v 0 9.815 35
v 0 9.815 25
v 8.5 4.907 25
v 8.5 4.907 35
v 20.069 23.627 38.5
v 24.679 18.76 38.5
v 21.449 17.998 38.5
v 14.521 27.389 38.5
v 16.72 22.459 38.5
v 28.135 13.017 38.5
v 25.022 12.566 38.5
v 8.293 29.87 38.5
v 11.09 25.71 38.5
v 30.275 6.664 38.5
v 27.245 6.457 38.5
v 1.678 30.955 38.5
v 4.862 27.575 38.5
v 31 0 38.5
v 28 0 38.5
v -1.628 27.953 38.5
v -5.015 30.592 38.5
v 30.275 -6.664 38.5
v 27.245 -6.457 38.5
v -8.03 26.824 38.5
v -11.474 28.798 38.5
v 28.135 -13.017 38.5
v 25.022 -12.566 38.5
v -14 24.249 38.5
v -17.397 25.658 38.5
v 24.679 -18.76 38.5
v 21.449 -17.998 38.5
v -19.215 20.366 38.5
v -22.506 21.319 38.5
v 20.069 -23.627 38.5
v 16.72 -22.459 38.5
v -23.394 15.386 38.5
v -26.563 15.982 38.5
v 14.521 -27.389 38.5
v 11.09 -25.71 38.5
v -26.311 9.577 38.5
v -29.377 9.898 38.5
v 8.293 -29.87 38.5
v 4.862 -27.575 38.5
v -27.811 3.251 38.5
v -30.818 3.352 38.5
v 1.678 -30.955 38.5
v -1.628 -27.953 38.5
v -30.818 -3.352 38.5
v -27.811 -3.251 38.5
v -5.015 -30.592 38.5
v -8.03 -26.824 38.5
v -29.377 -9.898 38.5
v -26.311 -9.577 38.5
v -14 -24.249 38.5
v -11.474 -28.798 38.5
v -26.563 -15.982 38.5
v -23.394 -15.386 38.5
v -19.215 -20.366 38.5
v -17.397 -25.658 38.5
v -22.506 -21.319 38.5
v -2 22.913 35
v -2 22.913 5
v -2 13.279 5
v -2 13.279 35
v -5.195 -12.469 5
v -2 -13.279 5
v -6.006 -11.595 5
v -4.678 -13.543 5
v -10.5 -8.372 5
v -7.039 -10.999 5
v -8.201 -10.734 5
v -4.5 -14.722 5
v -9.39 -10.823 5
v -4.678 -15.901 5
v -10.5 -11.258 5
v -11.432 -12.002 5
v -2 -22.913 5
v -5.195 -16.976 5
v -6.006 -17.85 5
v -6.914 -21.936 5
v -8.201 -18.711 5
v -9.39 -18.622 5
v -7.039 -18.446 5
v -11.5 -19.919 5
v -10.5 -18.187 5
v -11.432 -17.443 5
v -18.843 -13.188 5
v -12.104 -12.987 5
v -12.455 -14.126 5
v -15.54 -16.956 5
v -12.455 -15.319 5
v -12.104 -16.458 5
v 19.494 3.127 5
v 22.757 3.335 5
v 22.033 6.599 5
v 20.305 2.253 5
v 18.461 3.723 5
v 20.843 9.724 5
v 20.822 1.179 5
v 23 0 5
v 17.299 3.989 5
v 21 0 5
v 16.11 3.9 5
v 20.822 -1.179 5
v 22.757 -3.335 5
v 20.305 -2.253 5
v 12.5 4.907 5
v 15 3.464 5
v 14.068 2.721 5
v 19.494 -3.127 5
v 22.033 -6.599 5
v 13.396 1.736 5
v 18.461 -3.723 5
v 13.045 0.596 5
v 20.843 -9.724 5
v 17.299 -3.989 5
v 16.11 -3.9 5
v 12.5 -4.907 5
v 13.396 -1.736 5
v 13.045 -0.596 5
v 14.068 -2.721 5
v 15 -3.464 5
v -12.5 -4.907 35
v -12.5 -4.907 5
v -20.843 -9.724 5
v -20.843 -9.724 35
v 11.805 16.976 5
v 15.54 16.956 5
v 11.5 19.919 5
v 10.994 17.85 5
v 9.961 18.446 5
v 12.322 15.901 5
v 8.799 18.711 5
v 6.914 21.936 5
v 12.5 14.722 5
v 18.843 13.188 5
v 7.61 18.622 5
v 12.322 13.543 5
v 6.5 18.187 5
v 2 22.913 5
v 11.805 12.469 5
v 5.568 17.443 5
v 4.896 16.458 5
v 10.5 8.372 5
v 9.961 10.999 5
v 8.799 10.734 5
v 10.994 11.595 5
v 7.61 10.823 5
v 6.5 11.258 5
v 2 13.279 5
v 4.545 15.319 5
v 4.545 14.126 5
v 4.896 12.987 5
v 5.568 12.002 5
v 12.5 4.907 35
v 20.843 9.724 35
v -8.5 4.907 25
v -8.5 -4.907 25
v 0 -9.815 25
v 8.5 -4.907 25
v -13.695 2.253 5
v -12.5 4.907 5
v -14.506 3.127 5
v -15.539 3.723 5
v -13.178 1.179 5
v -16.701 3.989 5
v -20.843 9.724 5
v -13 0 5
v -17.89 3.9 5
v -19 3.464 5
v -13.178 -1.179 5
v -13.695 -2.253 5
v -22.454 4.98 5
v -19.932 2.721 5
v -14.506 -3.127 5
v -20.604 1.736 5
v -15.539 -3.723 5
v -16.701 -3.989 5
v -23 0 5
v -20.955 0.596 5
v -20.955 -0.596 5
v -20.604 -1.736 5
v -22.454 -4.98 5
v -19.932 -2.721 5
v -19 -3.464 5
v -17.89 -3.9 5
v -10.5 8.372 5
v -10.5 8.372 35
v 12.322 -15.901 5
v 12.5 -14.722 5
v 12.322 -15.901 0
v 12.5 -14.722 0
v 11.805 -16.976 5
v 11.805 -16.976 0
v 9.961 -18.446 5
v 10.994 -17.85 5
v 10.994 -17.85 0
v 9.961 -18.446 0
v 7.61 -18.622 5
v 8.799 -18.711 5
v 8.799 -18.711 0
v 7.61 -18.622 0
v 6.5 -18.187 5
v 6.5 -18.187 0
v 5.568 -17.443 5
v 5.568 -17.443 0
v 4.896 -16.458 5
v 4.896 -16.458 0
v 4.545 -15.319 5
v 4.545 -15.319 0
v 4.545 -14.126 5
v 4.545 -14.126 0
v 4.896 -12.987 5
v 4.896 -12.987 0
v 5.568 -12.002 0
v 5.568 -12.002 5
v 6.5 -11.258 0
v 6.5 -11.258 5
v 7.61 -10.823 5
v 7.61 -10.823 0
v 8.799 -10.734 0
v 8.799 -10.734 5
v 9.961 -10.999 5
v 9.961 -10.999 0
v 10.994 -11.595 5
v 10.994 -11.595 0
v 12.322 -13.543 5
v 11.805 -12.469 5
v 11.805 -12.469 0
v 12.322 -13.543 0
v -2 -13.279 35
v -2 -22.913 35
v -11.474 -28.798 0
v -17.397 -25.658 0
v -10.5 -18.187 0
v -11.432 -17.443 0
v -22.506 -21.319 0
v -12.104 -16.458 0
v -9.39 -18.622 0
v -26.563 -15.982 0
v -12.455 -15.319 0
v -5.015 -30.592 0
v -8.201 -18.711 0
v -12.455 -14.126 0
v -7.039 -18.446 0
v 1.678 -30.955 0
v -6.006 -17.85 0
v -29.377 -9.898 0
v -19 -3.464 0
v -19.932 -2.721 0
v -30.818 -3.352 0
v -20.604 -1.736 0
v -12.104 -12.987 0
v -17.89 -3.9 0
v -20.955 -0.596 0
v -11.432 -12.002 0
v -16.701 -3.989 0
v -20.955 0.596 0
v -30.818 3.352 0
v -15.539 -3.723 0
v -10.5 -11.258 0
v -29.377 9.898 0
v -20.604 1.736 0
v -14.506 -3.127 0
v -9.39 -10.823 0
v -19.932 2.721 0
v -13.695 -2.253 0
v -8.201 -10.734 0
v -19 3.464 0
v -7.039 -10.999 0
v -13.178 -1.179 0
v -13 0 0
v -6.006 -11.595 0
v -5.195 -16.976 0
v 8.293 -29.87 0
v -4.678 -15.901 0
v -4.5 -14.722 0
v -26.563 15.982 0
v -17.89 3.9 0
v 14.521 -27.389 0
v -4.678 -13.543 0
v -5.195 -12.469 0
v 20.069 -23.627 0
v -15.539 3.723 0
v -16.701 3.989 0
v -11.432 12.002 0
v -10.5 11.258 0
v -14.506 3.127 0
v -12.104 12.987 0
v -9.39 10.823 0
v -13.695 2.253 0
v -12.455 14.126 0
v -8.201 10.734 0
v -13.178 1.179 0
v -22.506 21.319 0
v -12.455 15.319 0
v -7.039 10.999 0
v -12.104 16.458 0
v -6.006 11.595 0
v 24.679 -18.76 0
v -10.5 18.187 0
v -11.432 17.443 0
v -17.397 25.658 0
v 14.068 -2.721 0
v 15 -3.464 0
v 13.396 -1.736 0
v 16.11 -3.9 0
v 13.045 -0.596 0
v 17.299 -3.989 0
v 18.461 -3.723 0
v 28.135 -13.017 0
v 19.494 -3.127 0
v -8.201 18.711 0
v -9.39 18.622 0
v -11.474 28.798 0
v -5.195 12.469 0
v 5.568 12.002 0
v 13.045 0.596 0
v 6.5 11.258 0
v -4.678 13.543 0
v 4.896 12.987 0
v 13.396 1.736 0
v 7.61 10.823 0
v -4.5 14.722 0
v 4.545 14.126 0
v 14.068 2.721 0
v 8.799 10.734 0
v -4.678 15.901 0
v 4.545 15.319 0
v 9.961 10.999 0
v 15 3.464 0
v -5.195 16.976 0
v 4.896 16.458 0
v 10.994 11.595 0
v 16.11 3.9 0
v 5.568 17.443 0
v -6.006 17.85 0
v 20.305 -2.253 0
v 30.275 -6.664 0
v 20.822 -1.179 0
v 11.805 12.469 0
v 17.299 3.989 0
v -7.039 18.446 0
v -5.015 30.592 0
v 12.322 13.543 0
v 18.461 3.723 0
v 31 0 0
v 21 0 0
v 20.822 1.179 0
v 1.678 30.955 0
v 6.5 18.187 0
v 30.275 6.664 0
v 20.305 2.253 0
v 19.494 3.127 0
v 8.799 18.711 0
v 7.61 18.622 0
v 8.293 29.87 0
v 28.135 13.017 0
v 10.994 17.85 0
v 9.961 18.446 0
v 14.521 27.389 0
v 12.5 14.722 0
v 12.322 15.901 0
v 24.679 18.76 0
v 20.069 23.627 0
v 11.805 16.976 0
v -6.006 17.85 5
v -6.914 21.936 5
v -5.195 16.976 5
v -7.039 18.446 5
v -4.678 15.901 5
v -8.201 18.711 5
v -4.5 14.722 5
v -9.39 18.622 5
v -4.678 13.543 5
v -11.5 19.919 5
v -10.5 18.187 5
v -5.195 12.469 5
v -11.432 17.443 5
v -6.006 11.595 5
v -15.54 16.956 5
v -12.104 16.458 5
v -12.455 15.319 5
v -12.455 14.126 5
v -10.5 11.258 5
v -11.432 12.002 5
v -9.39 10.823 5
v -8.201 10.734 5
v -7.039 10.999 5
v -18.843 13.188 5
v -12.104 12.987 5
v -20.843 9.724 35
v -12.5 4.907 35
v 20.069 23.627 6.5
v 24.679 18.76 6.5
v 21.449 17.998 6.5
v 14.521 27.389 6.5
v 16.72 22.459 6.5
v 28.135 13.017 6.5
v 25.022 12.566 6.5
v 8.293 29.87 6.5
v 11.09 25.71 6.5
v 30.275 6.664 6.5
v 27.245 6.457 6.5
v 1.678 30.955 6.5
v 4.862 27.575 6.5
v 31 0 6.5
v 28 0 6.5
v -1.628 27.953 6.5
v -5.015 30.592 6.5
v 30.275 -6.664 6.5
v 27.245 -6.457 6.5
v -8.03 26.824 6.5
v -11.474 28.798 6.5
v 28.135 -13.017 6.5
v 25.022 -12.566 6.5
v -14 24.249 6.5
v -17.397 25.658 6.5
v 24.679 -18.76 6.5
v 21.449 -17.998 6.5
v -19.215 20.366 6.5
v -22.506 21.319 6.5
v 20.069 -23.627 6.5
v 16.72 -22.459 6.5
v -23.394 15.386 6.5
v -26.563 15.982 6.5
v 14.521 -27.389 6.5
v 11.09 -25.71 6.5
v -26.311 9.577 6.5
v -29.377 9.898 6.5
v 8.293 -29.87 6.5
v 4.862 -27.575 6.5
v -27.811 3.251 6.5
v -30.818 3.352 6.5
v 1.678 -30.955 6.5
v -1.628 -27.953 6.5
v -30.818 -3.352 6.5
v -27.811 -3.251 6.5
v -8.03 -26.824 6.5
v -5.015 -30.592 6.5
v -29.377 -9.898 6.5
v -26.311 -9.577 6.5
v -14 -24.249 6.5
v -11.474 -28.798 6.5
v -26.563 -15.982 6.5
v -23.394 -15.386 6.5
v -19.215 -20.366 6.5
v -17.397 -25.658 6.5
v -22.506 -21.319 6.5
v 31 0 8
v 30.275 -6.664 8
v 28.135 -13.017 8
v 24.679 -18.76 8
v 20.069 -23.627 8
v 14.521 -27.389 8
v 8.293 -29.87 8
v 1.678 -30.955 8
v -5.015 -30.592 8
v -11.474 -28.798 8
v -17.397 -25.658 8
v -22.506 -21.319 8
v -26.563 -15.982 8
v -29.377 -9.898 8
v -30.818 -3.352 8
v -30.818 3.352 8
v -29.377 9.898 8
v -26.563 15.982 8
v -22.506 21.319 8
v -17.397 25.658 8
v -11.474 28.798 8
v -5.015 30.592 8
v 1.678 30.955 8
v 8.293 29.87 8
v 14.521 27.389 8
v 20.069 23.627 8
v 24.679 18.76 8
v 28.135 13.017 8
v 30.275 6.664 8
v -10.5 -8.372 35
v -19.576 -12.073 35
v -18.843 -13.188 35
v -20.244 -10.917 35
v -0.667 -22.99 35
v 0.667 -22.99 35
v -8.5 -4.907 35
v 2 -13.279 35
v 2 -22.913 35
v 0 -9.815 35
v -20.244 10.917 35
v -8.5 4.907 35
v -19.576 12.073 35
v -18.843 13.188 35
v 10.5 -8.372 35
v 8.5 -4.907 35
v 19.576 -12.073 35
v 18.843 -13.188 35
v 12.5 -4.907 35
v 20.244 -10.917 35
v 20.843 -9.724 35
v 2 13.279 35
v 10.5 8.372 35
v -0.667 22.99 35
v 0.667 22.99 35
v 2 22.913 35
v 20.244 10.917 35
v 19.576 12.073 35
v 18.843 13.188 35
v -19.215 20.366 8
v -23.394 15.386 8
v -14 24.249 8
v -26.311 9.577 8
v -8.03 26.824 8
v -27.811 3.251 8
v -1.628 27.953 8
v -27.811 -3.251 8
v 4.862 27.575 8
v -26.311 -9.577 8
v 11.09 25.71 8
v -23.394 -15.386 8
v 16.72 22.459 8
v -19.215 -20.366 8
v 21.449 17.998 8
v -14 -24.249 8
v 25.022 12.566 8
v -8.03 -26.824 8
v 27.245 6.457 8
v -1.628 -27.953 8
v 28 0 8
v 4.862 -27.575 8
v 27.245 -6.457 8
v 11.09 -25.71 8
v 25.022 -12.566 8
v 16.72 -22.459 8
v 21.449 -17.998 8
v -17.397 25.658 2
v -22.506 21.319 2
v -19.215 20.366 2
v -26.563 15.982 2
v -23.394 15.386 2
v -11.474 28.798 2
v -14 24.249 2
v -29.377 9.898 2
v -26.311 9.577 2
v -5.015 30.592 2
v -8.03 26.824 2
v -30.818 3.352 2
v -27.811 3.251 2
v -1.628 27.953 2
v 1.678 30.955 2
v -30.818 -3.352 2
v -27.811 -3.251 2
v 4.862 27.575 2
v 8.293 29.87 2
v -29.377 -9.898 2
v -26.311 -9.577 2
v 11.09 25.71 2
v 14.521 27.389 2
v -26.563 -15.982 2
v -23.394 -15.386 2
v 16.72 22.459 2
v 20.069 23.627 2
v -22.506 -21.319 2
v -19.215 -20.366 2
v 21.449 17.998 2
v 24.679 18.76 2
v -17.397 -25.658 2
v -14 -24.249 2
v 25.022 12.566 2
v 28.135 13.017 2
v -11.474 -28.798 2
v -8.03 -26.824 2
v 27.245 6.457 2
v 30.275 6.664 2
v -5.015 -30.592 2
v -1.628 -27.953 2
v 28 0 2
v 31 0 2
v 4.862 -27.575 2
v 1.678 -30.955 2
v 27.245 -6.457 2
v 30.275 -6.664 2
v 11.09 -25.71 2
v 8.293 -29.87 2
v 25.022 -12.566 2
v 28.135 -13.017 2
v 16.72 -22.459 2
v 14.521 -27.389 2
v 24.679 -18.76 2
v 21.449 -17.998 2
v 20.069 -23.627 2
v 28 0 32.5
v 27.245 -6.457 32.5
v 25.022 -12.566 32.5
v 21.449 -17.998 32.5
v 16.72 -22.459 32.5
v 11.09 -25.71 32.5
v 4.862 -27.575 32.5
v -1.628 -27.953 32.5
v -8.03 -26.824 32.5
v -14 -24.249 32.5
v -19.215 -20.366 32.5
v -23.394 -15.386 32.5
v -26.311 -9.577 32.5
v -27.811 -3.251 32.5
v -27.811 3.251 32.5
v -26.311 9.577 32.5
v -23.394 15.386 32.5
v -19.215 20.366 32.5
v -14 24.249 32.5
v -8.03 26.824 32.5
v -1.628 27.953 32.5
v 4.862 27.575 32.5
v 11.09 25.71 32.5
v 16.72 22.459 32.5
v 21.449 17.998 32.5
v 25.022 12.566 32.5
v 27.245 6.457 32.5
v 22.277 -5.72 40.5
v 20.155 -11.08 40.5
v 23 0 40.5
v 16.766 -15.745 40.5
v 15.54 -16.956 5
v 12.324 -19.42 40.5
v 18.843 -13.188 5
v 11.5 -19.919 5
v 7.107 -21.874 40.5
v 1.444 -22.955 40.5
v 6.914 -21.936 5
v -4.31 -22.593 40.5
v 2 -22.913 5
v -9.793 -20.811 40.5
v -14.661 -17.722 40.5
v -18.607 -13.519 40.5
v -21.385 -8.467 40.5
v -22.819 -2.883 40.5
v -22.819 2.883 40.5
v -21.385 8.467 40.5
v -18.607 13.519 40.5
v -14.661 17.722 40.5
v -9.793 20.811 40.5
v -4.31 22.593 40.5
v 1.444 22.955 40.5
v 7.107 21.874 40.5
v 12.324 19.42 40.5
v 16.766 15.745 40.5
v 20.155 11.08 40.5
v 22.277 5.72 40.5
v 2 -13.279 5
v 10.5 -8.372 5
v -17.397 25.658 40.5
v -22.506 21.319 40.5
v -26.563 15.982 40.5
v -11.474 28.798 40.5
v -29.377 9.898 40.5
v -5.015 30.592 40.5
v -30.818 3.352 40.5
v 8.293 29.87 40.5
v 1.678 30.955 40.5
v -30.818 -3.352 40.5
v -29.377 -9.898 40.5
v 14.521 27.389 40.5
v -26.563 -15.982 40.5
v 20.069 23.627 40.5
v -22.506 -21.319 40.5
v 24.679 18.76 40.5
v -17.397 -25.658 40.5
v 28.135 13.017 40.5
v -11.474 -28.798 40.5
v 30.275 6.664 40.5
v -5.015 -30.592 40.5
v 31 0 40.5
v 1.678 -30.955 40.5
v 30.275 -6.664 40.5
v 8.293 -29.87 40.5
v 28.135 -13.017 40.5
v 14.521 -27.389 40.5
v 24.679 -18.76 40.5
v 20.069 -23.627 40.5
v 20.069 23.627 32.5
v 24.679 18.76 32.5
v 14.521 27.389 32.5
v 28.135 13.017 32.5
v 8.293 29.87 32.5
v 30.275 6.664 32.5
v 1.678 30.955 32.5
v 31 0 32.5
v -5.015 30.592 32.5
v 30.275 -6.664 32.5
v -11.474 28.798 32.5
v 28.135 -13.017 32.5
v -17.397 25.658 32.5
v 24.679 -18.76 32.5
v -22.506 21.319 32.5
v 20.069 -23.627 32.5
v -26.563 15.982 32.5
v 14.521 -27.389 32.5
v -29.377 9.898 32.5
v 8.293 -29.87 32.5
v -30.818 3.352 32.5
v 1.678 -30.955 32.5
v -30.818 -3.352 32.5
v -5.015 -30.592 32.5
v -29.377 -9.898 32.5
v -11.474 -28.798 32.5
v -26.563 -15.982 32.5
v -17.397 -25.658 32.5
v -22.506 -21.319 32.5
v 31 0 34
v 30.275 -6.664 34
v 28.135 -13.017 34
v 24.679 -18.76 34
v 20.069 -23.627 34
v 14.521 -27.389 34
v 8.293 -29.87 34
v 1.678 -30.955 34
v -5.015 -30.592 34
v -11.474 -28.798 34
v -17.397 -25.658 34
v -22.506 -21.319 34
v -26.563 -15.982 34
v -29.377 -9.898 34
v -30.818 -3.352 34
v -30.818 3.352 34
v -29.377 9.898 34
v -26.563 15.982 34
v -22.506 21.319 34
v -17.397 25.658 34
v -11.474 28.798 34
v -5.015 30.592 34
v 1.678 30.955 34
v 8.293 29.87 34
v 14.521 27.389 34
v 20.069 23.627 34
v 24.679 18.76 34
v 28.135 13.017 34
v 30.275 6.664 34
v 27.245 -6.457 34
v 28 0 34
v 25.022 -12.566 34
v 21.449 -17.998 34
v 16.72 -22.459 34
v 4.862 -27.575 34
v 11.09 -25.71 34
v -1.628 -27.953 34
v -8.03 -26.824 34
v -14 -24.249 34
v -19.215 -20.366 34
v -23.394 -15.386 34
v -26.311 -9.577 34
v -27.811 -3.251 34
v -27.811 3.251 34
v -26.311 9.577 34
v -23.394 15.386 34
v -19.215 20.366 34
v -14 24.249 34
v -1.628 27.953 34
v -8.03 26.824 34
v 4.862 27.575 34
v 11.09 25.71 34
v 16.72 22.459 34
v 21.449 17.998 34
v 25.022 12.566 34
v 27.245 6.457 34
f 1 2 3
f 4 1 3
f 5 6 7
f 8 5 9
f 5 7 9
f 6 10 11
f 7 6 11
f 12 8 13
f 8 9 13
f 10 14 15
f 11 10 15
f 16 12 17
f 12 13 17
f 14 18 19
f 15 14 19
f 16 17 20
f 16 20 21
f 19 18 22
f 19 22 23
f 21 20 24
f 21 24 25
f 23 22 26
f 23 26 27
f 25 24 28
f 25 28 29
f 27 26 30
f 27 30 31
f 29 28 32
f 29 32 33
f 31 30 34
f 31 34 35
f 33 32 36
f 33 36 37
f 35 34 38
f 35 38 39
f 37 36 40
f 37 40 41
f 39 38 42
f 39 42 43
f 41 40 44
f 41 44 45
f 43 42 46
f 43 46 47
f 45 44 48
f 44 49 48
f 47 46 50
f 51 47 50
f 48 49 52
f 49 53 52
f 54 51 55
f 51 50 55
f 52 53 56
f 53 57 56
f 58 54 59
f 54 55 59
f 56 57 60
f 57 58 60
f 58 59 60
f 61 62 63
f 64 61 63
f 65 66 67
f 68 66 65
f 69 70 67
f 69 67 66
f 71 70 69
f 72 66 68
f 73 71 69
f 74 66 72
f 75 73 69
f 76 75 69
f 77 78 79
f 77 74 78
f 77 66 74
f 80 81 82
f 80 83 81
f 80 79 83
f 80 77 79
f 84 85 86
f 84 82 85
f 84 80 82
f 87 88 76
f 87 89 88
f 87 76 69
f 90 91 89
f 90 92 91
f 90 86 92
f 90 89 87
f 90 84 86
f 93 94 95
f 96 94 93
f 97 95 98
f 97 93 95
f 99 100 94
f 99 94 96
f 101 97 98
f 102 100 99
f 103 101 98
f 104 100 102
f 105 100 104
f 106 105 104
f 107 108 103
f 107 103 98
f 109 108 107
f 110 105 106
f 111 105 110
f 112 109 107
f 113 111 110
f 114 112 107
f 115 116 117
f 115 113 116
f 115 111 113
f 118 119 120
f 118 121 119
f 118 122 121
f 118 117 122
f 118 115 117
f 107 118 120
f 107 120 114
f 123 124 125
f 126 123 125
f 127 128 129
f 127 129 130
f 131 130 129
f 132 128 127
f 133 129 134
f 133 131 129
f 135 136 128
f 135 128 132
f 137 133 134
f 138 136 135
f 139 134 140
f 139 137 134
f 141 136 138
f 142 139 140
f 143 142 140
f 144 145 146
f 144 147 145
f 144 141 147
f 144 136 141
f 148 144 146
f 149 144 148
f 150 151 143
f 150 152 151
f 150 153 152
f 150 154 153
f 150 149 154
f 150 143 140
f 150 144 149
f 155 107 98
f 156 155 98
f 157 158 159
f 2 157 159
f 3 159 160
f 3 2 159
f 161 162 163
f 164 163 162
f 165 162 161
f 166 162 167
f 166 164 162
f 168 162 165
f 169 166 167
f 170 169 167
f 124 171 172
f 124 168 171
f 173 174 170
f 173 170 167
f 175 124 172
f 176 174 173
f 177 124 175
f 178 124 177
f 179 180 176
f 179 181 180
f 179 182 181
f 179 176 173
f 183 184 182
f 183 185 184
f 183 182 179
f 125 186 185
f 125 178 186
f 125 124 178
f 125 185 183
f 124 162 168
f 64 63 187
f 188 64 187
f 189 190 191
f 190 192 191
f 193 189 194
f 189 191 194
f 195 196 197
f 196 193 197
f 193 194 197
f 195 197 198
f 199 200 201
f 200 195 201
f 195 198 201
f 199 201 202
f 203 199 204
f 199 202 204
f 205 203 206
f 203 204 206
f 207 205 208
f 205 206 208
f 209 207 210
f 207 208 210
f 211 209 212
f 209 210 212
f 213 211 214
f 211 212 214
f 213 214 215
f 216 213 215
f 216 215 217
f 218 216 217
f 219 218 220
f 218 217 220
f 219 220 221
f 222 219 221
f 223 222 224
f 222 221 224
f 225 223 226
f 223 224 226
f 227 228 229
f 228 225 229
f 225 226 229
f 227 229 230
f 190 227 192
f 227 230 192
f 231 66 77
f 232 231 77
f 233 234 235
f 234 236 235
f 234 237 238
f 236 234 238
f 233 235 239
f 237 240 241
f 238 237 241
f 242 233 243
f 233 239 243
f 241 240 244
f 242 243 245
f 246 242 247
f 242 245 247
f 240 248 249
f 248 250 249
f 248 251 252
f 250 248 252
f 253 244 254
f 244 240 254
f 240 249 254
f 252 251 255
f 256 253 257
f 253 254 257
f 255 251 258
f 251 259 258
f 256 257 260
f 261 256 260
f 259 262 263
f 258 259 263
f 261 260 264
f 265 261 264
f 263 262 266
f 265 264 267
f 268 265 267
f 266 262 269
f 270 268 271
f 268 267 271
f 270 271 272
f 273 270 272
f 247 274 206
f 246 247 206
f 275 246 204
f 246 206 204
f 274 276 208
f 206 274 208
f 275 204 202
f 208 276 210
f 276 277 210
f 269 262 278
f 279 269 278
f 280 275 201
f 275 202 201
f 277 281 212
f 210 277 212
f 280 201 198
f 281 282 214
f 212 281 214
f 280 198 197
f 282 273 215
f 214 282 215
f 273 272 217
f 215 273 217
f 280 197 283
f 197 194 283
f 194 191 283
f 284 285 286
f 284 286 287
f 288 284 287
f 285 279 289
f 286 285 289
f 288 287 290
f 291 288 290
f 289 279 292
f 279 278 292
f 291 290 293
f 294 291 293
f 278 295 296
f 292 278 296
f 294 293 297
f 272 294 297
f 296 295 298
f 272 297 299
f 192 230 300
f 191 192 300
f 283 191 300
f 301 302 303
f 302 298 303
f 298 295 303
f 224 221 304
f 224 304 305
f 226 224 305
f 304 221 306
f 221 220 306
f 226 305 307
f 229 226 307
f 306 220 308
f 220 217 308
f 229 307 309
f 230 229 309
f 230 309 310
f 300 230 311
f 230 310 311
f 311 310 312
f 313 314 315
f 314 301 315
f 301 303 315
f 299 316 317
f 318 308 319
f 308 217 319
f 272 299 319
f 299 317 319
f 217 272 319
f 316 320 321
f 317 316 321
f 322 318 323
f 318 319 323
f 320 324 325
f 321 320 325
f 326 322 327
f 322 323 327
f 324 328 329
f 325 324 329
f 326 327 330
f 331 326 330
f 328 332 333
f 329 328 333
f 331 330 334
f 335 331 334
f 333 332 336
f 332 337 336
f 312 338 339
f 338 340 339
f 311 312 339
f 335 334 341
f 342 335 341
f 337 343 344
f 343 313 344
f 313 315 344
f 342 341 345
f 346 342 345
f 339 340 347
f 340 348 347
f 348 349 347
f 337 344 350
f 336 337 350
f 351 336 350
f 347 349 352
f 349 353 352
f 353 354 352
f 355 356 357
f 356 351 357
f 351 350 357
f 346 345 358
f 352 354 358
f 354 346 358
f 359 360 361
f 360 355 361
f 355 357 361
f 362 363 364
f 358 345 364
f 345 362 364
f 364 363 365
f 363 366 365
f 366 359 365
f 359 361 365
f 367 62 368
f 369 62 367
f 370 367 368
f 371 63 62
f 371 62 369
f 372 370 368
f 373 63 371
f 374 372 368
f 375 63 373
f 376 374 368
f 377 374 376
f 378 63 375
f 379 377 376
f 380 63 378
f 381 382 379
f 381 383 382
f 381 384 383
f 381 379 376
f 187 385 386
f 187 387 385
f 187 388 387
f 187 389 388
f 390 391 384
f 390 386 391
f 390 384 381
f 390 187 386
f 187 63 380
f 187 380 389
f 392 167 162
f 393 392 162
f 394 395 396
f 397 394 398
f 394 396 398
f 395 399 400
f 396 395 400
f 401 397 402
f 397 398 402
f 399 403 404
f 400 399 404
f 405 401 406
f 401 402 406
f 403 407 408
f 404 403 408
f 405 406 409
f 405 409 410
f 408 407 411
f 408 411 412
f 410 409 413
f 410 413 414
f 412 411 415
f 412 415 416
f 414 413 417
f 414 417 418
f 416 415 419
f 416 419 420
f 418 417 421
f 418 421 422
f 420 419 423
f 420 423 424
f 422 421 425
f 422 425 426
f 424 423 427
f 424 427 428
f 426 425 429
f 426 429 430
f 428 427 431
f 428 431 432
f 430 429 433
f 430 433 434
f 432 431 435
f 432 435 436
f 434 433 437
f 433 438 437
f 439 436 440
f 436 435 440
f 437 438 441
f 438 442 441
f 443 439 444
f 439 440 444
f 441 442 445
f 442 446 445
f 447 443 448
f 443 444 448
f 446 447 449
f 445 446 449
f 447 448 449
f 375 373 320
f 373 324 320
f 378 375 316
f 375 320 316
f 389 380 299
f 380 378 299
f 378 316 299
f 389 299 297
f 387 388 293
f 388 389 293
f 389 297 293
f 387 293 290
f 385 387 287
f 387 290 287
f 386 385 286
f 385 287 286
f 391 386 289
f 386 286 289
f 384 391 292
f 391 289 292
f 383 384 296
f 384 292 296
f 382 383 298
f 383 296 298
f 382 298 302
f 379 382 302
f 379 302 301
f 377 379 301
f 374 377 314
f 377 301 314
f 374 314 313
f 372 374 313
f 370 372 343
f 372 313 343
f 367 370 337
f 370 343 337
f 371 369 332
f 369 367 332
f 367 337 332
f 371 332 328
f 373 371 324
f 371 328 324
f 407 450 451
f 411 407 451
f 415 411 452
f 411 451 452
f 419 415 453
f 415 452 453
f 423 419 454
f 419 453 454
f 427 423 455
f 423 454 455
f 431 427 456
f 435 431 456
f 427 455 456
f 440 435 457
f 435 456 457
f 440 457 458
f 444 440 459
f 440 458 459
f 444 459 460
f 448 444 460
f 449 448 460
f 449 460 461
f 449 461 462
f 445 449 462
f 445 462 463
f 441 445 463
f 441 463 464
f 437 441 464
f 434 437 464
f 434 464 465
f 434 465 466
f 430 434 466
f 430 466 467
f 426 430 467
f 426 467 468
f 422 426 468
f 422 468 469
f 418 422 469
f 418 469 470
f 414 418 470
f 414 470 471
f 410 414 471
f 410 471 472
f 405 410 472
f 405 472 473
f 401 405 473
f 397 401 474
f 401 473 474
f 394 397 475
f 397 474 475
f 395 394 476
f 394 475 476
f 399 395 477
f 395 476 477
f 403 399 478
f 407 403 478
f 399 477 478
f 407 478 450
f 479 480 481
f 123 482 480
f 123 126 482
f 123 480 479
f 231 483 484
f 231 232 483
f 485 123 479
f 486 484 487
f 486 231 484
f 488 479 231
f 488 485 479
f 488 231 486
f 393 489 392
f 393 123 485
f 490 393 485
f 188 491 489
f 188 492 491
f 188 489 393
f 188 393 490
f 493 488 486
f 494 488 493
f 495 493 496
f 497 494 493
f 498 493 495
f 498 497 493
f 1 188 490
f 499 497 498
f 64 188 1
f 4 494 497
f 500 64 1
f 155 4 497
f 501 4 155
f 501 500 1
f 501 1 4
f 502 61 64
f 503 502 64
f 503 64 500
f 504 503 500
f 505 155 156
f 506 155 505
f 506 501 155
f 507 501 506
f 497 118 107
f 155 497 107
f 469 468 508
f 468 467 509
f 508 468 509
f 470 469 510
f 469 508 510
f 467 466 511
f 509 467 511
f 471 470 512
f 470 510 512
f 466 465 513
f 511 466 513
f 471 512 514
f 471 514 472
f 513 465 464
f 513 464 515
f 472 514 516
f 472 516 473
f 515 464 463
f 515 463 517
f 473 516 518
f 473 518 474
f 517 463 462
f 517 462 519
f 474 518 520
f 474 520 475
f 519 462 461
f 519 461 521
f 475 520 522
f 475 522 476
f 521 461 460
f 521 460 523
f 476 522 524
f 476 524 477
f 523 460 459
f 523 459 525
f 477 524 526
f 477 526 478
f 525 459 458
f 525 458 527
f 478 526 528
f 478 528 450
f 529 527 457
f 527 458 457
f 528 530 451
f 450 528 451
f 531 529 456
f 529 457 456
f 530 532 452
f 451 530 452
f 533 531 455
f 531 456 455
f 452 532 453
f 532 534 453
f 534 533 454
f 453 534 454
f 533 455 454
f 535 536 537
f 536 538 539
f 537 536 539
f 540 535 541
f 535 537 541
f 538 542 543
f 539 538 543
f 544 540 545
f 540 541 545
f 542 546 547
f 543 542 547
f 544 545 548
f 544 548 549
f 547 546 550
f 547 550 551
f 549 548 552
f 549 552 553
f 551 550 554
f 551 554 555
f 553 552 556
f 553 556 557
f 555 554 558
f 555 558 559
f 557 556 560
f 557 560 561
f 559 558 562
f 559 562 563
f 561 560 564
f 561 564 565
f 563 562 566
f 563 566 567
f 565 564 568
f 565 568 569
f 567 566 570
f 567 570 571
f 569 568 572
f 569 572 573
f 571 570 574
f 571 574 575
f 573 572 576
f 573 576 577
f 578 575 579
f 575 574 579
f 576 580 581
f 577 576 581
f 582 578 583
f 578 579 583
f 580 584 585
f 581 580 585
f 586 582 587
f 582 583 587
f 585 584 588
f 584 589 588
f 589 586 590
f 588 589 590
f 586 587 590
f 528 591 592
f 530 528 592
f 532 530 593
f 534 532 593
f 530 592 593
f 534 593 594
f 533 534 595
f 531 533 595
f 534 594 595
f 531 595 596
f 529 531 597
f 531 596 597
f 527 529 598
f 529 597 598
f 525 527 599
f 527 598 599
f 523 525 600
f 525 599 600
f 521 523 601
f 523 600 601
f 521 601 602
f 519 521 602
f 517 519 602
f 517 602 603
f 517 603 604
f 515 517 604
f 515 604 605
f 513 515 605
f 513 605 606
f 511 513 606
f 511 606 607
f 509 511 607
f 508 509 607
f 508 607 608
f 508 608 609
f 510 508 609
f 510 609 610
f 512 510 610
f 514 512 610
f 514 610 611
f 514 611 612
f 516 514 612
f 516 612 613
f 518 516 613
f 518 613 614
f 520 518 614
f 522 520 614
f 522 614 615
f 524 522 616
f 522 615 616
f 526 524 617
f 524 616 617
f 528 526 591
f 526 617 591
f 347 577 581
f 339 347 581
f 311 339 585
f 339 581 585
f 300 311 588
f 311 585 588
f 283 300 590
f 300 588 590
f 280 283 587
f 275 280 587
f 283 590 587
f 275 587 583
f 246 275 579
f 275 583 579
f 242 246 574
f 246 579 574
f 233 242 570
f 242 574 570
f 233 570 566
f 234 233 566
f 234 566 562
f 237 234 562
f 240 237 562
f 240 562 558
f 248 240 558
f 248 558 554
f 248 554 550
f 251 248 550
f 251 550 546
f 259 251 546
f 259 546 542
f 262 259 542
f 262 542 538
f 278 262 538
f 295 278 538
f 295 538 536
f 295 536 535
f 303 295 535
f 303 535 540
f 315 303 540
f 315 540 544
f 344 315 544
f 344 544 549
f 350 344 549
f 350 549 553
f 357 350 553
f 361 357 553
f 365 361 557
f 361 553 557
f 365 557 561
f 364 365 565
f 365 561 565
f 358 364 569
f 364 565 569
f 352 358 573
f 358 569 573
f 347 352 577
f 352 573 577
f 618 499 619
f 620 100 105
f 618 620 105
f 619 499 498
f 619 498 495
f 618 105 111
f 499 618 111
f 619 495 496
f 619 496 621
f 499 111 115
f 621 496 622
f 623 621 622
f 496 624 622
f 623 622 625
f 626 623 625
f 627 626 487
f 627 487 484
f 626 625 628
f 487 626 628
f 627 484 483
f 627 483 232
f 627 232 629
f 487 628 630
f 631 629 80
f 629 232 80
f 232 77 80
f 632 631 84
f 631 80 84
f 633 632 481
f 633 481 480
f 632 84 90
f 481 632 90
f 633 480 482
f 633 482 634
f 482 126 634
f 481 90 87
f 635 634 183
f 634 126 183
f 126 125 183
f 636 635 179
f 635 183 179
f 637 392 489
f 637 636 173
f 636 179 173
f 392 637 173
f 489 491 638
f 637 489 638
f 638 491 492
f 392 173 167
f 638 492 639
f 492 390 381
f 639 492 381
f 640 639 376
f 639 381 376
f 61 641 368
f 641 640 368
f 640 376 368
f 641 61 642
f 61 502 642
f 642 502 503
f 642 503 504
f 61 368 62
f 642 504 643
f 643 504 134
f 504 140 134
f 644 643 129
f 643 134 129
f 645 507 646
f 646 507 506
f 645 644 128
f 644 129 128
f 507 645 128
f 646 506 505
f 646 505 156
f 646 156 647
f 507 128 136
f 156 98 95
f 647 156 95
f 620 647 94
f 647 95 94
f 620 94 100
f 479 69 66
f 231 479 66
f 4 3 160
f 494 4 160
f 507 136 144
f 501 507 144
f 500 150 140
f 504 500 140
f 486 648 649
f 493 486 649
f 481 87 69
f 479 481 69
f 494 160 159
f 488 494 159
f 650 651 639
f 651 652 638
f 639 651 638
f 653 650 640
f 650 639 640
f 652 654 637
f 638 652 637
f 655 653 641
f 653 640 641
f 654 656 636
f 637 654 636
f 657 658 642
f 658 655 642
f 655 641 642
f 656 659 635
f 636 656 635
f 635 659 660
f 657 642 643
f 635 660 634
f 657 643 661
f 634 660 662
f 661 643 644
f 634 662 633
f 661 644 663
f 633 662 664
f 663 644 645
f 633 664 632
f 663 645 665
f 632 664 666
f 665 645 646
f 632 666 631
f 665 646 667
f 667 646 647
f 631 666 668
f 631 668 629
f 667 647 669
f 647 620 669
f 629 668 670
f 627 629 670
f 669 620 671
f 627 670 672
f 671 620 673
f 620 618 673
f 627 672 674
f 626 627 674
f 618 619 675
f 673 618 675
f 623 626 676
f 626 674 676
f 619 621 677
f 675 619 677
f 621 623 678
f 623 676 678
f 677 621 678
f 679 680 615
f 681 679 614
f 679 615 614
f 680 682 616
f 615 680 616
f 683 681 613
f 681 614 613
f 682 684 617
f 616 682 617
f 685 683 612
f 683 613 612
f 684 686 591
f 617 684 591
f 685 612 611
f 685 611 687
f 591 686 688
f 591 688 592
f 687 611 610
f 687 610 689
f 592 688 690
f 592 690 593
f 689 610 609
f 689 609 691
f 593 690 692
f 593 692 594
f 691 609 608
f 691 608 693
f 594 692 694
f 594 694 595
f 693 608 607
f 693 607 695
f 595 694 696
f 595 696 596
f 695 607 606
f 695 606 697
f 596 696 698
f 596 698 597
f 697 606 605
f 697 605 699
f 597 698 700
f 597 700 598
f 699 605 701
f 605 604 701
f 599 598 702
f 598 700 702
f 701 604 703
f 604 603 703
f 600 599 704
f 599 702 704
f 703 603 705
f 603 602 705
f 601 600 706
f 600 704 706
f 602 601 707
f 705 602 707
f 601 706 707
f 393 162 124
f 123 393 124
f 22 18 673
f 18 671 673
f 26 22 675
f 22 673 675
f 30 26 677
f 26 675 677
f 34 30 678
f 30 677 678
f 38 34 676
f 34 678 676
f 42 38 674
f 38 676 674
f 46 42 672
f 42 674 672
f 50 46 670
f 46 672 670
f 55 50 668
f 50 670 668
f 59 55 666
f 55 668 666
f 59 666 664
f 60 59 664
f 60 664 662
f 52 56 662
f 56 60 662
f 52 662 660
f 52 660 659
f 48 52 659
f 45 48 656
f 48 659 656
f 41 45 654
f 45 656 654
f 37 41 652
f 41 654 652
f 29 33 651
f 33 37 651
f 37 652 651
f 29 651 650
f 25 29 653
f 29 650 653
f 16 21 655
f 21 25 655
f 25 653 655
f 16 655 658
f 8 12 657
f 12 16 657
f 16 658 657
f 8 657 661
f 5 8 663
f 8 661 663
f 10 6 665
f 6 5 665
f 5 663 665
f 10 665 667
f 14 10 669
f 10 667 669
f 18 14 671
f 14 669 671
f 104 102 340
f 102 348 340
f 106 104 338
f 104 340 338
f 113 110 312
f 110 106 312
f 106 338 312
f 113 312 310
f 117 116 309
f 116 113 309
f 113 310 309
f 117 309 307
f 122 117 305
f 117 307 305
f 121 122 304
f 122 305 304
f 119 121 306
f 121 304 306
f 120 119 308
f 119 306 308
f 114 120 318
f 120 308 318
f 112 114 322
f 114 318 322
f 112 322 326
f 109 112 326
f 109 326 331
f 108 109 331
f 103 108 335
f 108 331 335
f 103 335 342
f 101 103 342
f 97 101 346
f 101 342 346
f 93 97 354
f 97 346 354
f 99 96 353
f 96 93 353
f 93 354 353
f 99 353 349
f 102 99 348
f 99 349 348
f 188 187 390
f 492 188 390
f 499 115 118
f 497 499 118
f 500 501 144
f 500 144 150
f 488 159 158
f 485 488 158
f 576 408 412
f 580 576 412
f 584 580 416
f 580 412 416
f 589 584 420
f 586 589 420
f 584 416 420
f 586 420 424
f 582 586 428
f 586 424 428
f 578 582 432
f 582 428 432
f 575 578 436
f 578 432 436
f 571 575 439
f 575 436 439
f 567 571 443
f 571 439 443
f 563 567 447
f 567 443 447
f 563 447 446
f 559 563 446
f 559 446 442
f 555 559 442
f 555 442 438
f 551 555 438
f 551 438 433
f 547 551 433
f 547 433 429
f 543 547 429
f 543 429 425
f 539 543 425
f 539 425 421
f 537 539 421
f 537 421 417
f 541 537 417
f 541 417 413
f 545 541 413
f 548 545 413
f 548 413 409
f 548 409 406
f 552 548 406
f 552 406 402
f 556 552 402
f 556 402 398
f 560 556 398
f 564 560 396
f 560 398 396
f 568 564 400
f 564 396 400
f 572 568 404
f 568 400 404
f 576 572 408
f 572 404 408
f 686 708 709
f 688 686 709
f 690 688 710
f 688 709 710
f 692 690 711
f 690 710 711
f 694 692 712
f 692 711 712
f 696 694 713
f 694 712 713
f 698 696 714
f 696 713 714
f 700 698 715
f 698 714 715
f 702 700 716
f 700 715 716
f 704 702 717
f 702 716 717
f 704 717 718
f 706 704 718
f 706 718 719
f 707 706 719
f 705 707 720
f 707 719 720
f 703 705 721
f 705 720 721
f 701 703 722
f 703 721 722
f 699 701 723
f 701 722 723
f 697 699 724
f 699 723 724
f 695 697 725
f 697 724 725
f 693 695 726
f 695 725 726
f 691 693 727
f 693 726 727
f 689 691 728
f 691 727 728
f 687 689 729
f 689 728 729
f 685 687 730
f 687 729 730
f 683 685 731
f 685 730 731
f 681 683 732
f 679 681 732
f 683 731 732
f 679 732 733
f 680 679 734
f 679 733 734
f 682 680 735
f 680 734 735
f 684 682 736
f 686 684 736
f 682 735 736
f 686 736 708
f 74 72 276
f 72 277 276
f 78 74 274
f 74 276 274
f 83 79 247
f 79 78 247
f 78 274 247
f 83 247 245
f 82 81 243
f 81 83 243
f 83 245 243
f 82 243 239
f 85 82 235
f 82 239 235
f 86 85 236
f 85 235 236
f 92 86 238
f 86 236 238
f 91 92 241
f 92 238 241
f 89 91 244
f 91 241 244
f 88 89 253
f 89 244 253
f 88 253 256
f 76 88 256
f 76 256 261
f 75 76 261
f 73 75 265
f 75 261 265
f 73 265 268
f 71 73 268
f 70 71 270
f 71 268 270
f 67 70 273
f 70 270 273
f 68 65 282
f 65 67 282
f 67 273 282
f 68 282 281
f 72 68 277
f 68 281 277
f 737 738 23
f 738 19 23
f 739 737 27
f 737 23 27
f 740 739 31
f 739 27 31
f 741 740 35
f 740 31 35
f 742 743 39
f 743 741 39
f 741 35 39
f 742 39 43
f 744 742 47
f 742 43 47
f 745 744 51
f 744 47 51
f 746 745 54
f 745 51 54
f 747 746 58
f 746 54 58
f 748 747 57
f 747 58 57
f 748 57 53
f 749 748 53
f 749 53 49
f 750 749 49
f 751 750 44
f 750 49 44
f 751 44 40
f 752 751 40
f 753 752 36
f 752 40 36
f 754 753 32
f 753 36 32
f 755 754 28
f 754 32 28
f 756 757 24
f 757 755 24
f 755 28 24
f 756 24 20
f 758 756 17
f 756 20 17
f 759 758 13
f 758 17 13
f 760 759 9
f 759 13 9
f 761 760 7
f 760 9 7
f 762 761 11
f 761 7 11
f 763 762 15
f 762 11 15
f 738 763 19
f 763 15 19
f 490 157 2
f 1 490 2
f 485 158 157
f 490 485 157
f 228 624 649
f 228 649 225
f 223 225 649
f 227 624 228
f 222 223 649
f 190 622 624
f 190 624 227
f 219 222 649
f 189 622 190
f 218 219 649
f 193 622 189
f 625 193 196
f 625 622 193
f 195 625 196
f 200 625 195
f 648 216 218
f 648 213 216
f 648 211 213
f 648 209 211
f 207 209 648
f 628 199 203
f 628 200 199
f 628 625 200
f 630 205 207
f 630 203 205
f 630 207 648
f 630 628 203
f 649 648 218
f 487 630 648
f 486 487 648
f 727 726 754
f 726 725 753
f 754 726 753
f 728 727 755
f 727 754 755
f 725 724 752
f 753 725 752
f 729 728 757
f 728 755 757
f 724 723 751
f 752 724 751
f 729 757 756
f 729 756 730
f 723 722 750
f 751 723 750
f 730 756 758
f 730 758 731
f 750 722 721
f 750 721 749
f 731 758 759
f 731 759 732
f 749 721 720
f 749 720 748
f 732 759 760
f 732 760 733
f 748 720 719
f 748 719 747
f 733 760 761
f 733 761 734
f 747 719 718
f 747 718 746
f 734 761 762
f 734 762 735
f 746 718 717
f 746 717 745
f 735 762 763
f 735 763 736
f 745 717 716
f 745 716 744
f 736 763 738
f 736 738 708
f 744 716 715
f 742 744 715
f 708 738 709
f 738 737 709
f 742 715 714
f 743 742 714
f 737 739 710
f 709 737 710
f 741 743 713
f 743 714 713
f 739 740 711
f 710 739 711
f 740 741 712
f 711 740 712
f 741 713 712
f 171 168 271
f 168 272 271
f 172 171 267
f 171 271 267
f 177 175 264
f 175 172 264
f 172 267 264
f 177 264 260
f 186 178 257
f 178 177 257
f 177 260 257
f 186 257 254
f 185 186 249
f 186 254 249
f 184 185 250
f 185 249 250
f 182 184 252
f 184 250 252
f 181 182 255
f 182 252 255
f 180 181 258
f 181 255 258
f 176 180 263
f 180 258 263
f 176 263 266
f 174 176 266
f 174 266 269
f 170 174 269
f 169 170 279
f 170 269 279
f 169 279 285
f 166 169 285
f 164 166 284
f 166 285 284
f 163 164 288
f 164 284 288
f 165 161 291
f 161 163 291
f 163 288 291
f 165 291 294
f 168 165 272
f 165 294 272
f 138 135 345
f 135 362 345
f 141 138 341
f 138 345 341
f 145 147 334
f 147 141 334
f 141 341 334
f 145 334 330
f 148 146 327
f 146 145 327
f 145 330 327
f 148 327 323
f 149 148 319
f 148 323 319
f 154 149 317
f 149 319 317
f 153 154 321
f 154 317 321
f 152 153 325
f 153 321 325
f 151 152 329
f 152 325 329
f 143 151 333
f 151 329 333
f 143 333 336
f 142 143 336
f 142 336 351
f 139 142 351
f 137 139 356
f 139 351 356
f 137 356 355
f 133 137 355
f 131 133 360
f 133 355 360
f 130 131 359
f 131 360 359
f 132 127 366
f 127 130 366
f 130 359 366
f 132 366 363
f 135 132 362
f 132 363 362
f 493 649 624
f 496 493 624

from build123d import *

# Parameters (mm, degrees)
F0_W     = 23
F0_H     = 5
F2_R     = 4
F3_DEPTH = 5
F6_DEPTH = 25
F7_DEPTH = 35
F5_DEPTH = 35
F8_COUNT = 6


with BuildPart() as f1:
    # F0 (on Front) → F1 (revolve)
    with BuildSketch(Plane.XZ):
        with Locations((11.5, 2.5)):
            Rectangle(F0_W, F0_H)
        Polygon((23, 5), (23, 0), (31, 0), (31, 2), (28, 2), (28, 6.5), (31, 6.5), (31, 8), (28, 8), (28, 32.5), (31, 32.5), (31, 34), (28, 34), (28, 38.5), (31, 38.5), (31, 40.5), (23, 40.5), (23, 20.25), align=None)
    revolve(axis=Axis((0, 0, 2.5), (0, 0, -1)))

    # F2 (on face) → F3 (cut, through all)
    with BuildSketch(Plane(origin=(0, 0, 0), x_dir=(1, 0, 0), z_dir=(0, 0, -1))):
        with Locations((-17, 0)):
            Circle(F2_R)
        with Locations((-8.5, -14.7224318643)):
            Circle(F2_R)
        with Locations((8.5, -14.7224318643)):
            Circle(F2_R)
        with Locations((17, 0)):
            Circle(F2_R)
        with Locations((8.5, 14.7224318643)):
            Circle(F2_R)
        with Locations((-8.5, 14.7224318643)):
            Circle(F2_R)
    extrude(amount=-F3_DEPTH, mode=Mode.SUBTRACT)

    # F4 (on Top) → F6 (join)
    with BuildSketch(Plane.XY):
        Polygon((8.5, 4.9074772881), (0, 9.8149545762), (-8.5, 4.9074772881), (-8.5, -4.9074772881), (0, -9.8149545762), (8.5, -4.9074772881), align=None)
    extrude(amount=F6_DEPTH)

    # F4 (on Top) → F7 (join)
    with BuildSketch(Plane.XY):
        Polygon((2, 9.8149545762), (0, 9.8149545762), (-2, 9.8149545762), (-2, 13.2790561914), (-12.5, 7.2168783649), (-12.5, -7.2168783649), (0, -14.4337567297), (12.5, -7.2168783649), (12.5, 7.2168783649), (2, 13.2790561914), align=None)
        Polygon((-8.5, 4.9074772881), (0, 9.8149545762), (8.5, 4.9074772881), (8.5, -4.9074772881), (0, -9.8149545762), (-8.5, -4.9074772881), align=None, mode=Mode.SUBTRACT)
        Polygon((-2, 9.8149545762), (0, 9.8149545762), (2, 9.8149545762), (2, 13.2790561914), (0, 14.4337567297), (-2, 13.2790561914), align=None)
    extrude(amount=F7_DEPTH)

    # F4 (on Top) → F5 (join)
    with BuildSketch(Plane.XY):
        Polygon((-2, 23), (-2, 13.2790561914), (0, 14.4337567297), (2, 13.2790561914), (2, 23), align=None)
    extrude(amount=F5_DEPTH)

    # F8: F1 ×6 about axis
    f8_axis = Axis((0, 0, 40.5), (0, 0, -1))


with BuildPart() as f1_1:
    add(f1.part)
    for i in range(1, F8_COUNT):
        add(f1.part.rotate(f8_axis, i * 360 / F8_COUNT))


solid = f1_1.part
